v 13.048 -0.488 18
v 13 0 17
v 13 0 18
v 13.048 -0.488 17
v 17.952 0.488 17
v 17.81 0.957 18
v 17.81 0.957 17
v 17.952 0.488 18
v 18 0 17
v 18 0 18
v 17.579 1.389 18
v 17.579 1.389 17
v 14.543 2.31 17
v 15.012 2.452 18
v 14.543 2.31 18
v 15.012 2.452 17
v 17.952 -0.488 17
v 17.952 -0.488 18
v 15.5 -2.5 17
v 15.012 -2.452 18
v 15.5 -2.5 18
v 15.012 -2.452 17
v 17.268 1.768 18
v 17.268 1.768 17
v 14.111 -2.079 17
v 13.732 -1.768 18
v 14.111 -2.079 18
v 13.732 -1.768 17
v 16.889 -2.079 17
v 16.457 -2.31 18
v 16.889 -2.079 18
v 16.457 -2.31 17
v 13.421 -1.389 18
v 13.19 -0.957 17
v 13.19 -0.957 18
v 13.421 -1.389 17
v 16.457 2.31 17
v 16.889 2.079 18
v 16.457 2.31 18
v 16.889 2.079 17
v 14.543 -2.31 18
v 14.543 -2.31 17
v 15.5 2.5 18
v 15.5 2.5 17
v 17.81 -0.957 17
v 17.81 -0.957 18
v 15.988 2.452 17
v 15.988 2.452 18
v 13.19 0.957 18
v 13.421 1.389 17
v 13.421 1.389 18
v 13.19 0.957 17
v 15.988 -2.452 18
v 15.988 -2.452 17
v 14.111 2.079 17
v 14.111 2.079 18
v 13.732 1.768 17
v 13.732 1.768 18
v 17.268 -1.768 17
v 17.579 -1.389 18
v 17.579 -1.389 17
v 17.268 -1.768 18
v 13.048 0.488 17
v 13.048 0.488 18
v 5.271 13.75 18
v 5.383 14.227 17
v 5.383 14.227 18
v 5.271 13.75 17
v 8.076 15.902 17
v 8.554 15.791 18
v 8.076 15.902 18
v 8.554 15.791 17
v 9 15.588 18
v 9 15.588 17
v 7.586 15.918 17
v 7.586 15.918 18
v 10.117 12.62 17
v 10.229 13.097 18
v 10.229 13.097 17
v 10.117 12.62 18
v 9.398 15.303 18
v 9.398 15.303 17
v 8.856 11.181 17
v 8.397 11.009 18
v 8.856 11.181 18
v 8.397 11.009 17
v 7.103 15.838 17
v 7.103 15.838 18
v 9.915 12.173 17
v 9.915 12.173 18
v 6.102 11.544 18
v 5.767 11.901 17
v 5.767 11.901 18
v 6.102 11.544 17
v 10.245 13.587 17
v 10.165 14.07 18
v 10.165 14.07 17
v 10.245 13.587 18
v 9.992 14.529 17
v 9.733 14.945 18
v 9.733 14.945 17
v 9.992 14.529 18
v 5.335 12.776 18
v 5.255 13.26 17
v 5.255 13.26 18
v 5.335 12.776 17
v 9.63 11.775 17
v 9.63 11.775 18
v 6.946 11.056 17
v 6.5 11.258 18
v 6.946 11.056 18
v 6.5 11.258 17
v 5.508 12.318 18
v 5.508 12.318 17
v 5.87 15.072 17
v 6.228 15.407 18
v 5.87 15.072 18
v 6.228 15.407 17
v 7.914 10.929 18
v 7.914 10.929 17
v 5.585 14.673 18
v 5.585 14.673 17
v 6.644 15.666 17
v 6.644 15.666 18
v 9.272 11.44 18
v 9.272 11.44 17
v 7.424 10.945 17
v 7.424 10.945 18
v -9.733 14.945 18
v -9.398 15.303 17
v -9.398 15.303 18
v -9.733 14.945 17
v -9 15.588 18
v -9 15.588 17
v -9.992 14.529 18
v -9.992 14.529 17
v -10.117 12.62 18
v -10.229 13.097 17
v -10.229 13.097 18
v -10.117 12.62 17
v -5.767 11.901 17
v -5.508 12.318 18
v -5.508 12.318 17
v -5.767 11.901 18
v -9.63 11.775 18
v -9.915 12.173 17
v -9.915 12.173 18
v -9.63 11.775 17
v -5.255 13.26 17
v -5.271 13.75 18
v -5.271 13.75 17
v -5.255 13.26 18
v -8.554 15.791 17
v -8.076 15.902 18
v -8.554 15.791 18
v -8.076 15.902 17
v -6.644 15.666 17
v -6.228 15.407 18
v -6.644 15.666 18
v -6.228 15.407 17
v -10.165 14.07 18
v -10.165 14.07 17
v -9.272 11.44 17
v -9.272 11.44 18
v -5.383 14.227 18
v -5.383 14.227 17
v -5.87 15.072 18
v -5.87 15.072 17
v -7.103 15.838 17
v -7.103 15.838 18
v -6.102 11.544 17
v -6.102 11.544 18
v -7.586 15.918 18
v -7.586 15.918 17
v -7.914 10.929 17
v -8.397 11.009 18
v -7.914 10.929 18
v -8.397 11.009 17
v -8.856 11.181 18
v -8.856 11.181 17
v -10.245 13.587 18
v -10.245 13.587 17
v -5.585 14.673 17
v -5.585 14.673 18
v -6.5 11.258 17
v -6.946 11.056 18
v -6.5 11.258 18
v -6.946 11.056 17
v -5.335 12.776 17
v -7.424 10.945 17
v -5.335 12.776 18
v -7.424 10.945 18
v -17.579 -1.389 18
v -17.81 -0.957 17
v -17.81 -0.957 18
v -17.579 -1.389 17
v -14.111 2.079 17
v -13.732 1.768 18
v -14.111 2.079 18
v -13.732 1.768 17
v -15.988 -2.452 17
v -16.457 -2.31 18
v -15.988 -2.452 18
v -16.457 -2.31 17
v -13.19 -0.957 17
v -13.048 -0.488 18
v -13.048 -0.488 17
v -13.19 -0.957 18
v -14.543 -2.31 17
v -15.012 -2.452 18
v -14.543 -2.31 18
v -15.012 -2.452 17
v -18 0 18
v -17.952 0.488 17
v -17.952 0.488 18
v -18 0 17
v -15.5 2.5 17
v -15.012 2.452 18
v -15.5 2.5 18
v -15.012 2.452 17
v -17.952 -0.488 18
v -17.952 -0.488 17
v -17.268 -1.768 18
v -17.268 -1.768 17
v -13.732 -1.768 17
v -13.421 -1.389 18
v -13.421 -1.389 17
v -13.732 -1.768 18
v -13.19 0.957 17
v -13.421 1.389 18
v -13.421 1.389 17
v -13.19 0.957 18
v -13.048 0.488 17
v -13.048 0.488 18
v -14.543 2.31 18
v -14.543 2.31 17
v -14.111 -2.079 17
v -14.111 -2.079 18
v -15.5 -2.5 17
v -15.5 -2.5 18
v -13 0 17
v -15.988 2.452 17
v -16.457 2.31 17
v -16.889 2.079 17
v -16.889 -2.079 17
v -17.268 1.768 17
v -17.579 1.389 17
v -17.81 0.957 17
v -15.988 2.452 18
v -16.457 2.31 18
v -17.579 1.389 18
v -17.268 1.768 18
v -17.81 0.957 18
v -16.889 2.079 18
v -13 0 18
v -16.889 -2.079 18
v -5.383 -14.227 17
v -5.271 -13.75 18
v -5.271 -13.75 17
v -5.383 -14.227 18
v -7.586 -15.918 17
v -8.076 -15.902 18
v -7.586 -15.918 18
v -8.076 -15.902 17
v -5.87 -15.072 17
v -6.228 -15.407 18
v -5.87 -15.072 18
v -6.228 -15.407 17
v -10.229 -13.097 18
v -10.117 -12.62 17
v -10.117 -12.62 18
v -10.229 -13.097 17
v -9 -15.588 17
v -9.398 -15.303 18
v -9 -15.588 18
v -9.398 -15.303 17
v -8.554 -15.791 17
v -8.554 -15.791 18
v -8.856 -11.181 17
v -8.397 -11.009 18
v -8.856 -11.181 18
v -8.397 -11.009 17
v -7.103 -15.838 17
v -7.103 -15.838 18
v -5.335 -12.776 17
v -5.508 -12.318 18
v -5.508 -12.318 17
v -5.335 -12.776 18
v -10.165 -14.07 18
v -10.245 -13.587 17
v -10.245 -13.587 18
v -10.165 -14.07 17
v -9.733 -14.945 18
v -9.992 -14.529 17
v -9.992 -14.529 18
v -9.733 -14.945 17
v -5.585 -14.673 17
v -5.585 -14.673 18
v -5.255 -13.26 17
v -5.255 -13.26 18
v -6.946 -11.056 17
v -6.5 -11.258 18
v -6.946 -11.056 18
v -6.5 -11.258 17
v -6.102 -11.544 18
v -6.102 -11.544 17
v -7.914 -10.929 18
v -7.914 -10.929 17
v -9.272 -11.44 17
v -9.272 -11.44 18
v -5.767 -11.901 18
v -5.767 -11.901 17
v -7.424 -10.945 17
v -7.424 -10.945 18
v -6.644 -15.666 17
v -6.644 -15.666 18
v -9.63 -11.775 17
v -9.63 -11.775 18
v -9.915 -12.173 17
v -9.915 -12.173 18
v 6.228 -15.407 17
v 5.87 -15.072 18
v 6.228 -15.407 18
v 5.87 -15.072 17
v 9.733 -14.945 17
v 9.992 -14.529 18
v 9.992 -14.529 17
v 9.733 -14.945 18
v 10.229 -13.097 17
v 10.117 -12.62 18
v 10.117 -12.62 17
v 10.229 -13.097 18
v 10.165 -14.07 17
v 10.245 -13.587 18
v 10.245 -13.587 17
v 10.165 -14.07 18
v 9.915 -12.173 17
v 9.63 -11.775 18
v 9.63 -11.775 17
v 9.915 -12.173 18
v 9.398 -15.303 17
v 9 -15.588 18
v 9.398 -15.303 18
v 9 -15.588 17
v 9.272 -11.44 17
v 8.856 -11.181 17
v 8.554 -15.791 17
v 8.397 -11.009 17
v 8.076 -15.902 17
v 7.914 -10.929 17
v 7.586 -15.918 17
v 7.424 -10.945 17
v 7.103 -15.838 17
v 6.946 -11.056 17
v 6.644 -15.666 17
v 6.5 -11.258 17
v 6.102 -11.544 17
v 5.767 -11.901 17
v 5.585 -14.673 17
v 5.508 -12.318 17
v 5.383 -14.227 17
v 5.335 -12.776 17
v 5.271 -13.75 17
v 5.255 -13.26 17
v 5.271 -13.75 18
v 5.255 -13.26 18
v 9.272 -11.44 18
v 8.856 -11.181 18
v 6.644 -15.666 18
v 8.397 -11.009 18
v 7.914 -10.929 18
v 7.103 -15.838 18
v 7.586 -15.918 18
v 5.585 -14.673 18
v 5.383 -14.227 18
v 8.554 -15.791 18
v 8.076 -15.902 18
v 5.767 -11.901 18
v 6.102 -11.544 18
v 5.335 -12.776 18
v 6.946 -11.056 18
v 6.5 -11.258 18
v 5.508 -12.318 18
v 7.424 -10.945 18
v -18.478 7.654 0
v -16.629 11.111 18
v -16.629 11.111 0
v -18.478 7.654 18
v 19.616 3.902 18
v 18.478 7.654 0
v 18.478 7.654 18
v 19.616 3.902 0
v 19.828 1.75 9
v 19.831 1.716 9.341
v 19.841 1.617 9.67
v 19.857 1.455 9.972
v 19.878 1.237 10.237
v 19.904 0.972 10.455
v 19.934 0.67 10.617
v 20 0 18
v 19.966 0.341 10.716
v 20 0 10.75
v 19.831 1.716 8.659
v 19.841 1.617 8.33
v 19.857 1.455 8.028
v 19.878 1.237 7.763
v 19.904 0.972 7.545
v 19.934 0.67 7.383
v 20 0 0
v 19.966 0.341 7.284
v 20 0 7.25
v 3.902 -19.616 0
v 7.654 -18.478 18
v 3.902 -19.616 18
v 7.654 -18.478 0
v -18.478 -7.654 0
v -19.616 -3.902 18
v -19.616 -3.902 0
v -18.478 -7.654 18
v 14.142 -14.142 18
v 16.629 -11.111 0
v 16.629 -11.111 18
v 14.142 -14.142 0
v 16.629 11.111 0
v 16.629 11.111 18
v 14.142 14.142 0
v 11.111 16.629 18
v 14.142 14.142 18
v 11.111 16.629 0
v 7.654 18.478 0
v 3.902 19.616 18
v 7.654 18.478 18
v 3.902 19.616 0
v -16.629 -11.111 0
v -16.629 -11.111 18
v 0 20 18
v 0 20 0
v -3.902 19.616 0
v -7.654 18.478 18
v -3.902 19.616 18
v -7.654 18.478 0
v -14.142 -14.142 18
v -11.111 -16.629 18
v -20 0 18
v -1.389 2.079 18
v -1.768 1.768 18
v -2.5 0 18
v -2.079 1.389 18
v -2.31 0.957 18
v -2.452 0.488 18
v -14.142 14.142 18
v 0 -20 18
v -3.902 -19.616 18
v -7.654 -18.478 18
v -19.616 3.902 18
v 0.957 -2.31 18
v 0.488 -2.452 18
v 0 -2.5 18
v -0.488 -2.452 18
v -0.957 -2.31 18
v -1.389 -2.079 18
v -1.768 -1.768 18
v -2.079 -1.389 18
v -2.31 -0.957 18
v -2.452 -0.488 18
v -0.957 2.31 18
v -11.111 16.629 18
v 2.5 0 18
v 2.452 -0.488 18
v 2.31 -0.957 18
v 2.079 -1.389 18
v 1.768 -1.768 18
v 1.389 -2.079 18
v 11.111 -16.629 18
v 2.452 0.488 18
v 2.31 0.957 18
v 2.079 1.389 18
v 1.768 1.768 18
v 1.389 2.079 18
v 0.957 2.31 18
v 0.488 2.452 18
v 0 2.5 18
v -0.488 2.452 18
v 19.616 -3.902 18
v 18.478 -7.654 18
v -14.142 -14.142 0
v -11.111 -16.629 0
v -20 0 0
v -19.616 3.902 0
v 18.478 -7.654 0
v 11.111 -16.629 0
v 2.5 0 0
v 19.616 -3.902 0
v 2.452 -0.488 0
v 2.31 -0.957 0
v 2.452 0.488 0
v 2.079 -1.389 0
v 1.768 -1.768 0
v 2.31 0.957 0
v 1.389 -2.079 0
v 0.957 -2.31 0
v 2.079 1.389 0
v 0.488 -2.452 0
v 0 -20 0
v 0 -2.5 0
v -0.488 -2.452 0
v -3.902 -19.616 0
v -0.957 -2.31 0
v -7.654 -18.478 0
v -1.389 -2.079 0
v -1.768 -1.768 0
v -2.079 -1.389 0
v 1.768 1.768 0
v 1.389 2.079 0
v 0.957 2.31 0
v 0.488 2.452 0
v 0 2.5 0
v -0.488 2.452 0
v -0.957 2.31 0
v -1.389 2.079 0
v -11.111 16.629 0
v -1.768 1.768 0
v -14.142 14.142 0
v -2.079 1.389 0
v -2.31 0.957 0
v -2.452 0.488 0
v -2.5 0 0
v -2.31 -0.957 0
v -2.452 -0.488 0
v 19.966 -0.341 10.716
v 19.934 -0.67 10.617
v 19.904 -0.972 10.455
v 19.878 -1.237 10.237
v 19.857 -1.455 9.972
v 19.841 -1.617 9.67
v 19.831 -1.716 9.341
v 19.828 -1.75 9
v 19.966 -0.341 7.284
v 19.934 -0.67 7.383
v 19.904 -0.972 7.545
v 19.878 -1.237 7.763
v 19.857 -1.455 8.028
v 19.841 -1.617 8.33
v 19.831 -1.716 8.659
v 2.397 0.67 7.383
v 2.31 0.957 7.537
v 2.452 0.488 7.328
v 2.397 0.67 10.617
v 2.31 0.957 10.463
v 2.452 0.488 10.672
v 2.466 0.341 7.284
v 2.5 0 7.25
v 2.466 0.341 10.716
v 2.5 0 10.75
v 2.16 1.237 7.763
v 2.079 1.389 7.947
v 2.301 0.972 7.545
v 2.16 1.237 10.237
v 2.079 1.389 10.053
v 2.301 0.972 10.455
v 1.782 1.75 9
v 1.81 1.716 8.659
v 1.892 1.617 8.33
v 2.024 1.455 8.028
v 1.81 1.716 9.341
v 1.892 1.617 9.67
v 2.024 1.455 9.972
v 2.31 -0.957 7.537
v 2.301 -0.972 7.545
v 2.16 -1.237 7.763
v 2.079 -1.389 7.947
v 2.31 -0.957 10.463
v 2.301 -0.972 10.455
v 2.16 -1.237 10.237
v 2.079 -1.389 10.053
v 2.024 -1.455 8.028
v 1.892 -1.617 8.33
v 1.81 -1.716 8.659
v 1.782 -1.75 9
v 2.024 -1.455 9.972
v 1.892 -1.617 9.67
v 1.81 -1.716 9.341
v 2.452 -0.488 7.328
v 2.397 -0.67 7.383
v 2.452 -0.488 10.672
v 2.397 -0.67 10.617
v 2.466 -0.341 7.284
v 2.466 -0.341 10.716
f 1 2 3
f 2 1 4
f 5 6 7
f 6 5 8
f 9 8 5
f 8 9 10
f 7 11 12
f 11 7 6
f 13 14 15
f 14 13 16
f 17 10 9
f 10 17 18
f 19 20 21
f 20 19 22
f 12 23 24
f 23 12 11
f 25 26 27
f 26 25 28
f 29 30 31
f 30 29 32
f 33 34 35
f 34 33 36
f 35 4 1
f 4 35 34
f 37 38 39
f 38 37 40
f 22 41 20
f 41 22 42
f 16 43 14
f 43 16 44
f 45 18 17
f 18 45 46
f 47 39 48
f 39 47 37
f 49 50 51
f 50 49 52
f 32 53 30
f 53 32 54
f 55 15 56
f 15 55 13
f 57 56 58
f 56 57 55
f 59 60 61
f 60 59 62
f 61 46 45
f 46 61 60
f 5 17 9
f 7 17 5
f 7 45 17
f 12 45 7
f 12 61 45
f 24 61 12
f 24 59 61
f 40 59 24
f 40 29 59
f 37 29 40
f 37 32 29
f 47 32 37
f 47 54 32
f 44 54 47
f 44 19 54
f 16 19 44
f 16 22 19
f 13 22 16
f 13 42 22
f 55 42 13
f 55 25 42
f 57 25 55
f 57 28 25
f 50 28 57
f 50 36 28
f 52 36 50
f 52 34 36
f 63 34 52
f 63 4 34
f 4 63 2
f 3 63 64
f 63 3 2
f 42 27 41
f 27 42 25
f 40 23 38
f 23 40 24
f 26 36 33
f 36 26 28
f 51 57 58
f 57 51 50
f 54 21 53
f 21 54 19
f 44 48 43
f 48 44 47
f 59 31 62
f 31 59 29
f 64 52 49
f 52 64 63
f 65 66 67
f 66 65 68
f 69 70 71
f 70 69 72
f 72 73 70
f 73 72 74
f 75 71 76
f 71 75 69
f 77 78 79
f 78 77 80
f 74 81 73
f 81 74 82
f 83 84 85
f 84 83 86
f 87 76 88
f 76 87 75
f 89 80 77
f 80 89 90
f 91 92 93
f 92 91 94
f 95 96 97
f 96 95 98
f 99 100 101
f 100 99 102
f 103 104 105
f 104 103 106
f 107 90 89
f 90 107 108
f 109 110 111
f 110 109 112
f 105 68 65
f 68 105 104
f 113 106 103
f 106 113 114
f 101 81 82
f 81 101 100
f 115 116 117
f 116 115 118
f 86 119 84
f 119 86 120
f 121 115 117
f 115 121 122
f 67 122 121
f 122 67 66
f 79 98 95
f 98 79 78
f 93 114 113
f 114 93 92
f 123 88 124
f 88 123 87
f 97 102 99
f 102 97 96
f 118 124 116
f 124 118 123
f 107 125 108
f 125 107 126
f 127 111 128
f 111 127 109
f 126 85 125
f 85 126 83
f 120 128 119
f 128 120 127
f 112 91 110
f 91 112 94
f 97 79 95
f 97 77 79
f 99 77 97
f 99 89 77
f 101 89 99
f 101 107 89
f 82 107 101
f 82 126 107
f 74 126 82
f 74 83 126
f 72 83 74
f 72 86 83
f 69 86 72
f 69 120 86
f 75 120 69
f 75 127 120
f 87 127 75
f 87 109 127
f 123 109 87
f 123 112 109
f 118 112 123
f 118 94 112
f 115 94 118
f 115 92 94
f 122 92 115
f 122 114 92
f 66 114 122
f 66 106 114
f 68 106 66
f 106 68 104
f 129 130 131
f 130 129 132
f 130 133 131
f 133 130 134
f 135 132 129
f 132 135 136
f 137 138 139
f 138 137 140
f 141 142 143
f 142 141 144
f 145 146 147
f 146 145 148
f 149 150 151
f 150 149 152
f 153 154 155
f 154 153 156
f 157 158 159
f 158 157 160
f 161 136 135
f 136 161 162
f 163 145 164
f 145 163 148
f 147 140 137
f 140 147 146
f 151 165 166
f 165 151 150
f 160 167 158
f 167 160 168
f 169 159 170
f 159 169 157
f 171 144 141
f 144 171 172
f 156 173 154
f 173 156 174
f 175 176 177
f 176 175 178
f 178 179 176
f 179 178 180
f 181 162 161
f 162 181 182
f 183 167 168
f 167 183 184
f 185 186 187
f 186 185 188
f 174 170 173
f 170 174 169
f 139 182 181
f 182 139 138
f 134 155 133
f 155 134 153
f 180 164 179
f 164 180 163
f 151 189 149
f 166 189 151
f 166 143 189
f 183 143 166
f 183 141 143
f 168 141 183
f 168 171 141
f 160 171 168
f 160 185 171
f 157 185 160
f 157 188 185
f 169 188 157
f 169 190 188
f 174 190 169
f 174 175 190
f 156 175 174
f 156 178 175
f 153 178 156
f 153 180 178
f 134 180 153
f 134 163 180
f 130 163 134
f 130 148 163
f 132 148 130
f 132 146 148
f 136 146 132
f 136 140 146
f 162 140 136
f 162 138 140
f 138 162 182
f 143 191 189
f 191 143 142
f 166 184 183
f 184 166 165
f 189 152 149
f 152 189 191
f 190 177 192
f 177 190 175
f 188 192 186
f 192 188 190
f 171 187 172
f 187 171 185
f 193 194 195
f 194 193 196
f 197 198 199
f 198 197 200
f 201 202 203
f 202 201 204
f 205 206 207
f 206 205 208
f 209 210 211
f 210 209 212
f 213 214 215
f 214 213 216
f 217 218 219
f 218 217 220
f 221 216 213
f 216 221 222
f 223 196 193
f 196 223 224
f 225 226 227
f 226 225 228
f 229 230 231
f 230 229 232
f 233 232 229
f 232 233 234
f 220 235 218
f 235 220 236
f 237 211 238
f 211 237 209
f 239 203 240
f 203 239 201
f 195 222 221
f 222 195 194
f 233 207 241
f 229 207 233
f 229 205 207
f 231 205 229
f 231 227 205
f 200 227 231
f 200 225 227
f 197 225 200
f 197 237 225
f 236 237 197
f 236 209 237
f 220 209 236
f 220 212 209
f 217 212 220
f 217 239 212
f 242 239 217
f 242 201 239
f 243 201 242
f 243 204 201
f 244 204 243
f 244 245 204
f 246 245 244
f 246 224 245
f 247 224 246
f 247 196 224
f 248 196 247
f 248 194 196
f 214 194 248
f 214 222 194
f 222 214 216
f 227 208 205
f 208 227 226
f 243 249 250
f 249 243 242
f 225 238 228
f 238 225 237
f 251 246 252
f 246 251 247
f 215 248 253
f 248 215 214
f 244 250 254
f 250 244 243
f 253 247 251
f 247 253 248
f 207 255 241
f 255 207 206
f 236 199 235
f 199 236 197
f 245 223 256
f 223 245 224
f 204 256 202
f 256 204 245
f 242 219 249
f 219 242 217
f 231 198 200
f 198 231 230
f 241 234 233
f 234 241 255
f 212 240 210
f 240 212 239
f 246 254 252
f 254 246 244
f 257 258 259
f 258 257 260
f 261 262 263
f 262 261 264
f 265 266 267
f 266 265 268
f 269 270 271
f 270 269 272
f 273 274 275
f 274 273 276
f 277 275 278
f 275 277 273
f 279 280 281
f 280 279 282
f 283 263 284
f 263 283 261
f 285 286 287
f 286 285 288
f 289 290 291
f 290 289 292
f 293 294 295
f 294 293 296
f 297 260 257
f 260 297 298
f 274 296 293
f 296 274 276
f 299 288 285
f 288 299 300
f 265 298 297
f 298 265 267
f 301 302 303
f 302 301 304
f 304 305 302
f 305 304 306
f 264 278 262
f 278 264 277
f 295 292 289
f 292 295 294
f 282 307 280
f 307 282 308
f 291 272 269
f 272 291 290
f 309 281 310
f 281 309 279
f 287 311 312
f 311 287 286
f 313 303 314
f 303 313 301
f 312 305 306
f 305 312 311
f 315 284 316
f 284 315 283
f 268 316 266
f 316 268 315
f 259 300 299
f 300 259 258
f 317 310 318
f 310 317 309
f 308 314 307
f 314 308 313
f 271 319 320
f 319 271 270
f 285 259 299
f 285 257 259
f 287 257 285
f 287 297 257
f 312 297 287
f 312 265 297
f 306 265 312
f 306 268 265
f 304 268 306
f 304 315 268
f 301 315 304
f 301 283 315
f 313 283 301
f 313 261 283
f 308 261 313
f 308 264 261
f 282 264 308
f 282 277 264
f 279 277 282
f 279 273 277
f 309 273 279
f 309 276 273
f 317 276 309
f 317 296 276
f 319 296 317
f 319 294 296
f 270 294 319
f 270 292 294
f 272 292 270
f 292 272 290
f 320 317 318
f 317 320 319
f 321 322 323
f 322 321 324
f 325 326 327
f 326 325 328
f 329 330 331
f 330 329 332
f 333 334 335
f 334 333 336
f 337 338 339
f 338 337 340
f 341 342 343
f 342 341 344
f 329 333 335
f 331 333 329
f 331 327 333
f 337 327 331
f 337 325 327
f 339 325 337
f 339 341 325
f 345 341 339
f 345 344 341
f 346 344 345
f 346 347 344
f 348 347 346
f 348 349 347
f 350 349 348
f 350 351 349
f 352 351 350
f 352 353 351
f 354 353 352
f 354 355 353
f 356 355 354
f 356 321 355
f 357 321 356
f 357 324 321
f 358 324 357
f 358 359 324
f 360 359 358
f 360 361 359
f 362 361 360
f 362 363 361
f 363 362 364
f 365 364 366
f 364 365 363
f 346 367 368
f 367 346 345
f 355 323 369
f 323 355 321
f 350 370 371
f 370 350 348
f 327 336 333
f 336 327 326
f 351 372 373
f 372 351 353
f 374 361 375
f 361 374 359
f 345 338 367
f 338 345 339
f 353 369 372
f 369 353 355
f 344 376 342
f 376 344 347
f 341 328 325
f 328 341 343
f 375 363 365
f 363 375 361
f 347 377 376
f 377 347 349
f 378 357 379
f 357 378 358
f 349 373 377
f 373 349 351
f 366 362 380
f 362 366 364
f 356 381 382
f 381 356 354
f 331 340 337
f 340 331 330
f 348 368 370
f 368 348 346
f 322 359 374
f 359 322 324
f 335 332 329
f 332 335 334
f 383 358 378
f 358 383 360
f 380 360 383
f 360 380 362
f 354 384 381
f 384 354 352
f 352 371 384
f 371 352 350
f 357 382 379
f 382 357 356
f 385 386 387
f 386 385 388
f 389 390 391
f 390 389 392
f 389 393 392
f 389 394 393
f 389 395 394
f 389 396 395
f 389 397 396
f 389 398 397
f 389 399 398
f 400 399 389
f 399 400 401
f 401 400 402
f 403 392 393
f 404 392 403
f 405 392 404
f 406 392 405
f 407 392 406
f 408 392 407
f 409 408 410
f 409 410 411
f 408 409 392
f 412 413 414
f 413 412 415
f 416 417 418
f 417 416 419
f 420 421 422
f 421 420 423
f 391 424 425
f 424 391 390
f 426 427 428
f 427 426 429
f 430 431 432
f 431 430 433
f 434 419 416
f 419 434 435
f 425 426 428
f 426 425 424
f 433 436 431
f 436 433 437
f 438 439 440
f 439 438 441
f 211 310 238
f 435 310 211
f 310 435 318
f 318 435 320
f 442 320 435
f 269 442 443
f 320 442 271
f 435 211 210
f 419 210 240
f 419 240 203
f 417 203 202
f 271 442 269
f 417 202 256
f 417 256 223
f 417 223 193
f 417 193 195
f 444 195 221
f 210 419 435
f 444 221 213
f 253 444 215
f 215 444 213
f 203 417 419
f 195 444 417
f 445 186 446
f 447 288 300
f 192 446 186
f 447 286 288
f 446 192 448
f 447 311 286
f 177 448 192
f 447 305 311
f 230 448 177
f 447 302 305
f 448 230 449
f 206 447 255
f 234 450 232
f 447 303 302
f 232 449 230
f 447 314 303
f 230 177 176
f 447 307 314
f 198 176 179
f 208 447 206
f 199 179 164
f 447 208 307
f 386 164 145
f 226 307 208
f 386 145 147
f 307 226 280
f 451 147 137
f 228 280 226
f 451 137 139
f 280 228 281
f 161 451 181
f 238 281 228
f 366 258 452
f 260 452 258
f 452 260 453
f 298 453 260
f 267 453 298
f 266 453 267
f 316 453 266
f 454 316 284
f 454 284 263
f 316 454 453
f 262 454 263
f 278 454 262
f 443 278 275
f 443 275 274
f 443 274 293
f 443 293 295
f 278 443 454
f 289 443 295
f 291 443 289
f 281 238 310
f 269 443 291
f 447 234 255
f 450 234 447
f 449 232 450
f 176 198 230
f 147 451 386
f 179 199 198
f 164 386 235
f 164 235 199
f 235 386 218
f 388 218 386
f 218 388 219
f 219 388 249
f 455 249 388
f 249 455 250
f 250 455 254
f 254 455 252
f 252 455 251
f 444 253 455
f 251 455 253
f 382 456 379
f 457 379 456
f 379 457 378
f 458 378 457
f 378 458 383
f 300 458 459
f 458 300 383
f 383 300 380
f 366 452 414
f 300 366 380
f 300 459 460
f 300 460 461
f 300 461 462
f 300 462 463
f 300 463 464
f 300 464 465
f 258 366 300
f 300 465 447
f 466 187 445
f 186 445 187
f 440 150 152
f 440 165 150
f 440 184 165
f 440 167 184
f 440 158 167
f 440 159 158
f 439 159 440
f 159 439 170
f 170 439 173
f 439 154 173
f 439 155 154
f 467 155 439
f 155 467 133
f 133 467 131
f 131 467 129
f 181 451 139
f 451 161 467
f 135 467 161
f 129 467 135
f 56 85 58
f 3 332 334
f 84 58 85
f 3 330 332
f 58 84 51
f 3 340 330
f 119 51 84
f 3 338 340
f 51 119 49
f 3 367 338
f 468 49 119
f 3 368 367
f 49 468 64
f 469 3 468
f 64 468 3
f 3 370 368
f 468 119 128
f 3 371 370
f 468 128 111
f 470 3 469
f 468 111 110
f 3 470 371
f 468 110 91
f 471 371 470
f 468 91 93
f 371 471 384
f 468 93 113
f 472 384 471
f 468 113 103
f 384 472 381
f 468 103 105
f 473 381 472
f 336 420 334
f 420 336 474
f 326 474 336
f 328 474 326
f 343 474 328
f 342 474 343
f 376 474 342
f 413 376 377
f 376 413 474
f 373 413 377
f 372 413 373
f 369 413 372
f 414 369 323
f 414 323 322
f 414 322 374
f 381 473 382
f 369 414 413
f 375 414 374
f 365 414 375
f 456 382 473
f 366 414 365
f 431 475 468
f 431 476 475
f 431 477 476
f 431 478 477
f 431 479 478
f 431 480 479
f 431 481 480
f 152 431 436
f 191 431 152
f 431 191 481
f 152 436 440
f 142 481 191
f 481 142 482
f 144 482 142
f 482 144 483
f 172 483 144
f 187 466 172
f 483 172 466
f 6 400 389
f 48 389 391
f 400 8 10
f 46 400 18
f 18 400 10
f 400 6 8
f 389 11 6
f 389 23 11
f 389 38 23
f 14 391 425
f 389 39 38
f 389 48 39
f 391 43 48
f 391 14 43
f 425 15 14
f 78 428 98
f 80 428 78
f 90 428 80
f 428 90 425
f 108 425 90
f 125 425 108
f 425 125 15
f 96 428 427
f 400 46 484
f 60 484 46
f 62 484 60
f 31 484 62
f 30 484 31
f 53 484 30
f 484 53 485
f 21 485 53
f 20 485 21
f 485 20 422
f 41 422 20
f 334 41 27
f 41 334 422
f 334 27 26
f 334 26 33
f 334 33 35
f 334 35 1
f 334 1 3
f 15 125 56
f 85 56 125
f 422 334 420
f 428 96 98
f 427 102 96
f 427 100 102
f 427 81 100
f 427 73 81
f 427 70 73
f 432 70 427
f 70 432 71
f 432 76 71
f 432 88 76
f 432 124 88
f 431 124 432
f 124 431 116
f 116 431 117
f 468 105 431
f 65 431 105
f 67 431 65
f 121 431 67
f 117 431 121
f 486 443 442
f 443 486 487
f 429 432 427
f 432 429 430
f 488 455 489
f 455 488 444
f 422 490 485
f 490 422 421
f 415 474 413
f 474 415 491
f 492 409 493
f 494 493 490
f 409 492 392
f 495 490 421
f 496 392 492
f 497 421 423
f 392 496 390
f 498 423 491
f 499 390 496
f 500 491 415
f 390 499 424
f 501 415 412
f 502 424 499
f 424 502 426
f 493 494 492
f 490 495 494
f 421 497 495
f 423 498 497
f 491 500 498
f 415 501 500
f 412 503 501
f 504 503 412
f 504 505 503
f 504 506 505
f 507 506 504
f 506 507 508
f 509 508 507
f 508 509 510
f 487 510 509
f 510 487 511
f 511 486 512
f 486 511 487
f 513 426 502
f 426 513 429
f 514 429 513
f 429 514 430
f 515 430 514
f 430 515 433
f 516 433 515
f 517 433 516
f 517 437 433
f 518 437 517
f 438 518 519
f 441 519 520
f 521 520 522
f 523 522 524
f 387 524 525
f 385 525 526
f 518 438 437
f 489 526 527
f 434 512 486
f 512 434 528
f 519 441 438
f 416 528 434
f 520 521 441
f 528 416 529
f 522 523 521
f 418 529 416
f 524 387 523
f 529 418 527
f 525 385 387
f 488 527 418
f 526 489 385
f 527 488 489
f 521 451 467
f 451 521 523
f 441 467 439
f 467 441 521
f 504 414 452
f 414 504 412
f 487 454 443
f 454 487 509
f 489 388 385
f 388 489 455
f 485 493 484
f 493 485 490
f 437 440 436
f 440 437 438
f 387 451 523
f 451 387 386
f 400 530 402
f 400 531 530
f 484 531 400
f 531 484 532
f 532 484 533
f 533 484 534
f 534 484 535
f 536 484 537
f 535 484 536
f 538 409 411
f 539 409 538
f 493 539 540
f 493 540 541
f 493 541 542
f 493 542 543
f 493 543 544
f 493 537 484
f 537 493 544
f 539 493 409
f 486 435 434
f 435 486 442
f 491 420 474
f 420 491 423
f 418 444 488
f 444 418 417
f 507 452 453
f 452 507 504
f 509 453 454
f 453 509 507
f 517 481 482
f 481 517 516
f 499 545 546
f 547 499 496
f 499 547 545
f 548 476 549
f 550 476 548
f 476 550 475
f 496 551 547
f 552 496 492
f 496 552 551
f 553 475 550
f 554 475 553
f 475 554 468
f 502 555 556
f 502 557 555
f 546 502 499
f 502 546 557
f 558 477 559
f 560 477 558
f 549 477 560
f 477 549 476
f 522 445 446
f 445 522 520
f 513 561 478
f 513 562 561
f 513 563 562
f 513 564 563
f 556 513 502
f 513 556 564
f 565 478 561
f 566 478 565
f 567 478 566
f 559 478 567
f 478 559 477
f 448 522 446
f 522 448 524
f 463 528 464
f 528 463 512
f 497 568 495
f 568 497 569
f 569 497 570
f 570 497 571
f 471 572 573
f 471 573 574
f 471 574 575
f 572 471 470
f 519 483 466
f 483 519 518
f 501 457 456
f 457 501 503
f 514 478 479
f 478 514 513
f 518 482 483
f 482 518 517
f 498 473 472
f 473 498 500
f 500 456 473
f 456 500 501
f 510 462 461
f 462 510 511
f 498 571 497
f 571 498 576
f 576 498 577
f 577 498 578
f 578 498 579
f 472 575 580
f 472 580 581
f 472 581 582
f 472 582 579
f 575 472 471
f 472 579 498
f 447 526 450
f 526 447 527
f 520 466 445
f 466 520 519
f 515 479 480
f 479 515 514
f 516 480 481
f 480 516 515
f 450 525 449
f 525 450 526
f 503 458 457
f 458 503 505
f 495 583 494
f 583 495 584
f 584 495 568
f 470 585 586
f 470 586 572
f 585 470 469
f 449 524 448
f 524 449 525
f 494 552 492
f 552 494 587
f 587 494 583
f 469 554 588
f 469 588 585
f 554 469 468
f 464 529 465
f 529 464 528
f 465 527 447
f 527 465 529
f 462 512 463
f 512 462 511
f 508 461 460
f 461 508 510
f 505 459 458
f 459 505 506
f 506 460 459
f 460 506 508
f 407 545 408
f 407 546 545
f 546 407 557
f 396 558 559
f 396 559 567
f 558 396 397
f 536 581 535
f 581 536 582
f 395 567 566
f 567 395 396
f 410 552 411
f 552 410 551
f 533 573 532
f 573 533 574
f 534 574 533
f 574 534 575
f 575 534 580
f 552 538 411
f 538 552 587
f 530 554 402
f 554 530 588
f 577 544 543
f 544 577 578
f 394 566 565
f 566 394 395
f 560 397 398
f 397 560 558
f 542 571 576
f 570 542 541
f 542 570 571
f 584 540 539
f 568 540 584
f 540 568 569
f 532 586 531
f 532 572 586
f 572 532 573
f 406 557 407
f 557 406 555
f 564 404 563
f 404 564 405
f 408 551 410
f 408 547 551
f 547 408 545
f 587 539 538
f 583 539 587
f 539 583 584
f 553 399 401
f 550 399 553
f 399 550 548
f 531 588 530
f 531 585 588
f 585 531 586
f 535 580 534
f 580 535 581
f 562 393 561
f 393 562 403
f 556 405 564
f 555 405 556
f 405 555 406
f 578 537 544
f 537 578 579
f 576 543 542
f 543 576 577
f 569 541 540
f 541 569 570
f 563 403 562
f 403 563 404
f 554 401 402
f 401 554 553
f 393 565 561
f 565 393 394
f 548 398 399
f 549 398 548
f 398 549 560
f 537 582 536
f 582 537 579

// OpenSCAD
$fn = 32;

// ----------------------------------------------------------------------
// Control knob: dimpled knob
// ----------------------------------------------------------------------

// --- parameters (mm) ---
dimp_d = 5;               // finger dimple diameter
n_dimp = 6;               // number of dimples
dimp_r = 15.5;            // dimple ring radius
knob_d = 40;              // knob body diameter
knob_h = 18;              // knob body height
bore_d = 5;               // shaft bore diameter
set_d = 3.5;              // set screw bore diameter

dimp_step = 360 / n_dimp;  // dimple angular step

difference() {
  cylinder(h = knob_h, d = knob_d);
  translate([0, 0, -1]) cylinder(h = knob_h + 2, d = bore_d);
  translate([-1, 0, knob_h / 2]) rotate([0, 90, 0])
    cylinder(h = knob_d / 2 + bore_d / 2 + 2, d = set_d);  for (i = [0 : n_dimp - 1])
    rotate([0, 0, i * dimp_step])
      translate([dimp_r, 0, knob_h - 1])
        cylinder(h = 2, d = dimp_d);
}
